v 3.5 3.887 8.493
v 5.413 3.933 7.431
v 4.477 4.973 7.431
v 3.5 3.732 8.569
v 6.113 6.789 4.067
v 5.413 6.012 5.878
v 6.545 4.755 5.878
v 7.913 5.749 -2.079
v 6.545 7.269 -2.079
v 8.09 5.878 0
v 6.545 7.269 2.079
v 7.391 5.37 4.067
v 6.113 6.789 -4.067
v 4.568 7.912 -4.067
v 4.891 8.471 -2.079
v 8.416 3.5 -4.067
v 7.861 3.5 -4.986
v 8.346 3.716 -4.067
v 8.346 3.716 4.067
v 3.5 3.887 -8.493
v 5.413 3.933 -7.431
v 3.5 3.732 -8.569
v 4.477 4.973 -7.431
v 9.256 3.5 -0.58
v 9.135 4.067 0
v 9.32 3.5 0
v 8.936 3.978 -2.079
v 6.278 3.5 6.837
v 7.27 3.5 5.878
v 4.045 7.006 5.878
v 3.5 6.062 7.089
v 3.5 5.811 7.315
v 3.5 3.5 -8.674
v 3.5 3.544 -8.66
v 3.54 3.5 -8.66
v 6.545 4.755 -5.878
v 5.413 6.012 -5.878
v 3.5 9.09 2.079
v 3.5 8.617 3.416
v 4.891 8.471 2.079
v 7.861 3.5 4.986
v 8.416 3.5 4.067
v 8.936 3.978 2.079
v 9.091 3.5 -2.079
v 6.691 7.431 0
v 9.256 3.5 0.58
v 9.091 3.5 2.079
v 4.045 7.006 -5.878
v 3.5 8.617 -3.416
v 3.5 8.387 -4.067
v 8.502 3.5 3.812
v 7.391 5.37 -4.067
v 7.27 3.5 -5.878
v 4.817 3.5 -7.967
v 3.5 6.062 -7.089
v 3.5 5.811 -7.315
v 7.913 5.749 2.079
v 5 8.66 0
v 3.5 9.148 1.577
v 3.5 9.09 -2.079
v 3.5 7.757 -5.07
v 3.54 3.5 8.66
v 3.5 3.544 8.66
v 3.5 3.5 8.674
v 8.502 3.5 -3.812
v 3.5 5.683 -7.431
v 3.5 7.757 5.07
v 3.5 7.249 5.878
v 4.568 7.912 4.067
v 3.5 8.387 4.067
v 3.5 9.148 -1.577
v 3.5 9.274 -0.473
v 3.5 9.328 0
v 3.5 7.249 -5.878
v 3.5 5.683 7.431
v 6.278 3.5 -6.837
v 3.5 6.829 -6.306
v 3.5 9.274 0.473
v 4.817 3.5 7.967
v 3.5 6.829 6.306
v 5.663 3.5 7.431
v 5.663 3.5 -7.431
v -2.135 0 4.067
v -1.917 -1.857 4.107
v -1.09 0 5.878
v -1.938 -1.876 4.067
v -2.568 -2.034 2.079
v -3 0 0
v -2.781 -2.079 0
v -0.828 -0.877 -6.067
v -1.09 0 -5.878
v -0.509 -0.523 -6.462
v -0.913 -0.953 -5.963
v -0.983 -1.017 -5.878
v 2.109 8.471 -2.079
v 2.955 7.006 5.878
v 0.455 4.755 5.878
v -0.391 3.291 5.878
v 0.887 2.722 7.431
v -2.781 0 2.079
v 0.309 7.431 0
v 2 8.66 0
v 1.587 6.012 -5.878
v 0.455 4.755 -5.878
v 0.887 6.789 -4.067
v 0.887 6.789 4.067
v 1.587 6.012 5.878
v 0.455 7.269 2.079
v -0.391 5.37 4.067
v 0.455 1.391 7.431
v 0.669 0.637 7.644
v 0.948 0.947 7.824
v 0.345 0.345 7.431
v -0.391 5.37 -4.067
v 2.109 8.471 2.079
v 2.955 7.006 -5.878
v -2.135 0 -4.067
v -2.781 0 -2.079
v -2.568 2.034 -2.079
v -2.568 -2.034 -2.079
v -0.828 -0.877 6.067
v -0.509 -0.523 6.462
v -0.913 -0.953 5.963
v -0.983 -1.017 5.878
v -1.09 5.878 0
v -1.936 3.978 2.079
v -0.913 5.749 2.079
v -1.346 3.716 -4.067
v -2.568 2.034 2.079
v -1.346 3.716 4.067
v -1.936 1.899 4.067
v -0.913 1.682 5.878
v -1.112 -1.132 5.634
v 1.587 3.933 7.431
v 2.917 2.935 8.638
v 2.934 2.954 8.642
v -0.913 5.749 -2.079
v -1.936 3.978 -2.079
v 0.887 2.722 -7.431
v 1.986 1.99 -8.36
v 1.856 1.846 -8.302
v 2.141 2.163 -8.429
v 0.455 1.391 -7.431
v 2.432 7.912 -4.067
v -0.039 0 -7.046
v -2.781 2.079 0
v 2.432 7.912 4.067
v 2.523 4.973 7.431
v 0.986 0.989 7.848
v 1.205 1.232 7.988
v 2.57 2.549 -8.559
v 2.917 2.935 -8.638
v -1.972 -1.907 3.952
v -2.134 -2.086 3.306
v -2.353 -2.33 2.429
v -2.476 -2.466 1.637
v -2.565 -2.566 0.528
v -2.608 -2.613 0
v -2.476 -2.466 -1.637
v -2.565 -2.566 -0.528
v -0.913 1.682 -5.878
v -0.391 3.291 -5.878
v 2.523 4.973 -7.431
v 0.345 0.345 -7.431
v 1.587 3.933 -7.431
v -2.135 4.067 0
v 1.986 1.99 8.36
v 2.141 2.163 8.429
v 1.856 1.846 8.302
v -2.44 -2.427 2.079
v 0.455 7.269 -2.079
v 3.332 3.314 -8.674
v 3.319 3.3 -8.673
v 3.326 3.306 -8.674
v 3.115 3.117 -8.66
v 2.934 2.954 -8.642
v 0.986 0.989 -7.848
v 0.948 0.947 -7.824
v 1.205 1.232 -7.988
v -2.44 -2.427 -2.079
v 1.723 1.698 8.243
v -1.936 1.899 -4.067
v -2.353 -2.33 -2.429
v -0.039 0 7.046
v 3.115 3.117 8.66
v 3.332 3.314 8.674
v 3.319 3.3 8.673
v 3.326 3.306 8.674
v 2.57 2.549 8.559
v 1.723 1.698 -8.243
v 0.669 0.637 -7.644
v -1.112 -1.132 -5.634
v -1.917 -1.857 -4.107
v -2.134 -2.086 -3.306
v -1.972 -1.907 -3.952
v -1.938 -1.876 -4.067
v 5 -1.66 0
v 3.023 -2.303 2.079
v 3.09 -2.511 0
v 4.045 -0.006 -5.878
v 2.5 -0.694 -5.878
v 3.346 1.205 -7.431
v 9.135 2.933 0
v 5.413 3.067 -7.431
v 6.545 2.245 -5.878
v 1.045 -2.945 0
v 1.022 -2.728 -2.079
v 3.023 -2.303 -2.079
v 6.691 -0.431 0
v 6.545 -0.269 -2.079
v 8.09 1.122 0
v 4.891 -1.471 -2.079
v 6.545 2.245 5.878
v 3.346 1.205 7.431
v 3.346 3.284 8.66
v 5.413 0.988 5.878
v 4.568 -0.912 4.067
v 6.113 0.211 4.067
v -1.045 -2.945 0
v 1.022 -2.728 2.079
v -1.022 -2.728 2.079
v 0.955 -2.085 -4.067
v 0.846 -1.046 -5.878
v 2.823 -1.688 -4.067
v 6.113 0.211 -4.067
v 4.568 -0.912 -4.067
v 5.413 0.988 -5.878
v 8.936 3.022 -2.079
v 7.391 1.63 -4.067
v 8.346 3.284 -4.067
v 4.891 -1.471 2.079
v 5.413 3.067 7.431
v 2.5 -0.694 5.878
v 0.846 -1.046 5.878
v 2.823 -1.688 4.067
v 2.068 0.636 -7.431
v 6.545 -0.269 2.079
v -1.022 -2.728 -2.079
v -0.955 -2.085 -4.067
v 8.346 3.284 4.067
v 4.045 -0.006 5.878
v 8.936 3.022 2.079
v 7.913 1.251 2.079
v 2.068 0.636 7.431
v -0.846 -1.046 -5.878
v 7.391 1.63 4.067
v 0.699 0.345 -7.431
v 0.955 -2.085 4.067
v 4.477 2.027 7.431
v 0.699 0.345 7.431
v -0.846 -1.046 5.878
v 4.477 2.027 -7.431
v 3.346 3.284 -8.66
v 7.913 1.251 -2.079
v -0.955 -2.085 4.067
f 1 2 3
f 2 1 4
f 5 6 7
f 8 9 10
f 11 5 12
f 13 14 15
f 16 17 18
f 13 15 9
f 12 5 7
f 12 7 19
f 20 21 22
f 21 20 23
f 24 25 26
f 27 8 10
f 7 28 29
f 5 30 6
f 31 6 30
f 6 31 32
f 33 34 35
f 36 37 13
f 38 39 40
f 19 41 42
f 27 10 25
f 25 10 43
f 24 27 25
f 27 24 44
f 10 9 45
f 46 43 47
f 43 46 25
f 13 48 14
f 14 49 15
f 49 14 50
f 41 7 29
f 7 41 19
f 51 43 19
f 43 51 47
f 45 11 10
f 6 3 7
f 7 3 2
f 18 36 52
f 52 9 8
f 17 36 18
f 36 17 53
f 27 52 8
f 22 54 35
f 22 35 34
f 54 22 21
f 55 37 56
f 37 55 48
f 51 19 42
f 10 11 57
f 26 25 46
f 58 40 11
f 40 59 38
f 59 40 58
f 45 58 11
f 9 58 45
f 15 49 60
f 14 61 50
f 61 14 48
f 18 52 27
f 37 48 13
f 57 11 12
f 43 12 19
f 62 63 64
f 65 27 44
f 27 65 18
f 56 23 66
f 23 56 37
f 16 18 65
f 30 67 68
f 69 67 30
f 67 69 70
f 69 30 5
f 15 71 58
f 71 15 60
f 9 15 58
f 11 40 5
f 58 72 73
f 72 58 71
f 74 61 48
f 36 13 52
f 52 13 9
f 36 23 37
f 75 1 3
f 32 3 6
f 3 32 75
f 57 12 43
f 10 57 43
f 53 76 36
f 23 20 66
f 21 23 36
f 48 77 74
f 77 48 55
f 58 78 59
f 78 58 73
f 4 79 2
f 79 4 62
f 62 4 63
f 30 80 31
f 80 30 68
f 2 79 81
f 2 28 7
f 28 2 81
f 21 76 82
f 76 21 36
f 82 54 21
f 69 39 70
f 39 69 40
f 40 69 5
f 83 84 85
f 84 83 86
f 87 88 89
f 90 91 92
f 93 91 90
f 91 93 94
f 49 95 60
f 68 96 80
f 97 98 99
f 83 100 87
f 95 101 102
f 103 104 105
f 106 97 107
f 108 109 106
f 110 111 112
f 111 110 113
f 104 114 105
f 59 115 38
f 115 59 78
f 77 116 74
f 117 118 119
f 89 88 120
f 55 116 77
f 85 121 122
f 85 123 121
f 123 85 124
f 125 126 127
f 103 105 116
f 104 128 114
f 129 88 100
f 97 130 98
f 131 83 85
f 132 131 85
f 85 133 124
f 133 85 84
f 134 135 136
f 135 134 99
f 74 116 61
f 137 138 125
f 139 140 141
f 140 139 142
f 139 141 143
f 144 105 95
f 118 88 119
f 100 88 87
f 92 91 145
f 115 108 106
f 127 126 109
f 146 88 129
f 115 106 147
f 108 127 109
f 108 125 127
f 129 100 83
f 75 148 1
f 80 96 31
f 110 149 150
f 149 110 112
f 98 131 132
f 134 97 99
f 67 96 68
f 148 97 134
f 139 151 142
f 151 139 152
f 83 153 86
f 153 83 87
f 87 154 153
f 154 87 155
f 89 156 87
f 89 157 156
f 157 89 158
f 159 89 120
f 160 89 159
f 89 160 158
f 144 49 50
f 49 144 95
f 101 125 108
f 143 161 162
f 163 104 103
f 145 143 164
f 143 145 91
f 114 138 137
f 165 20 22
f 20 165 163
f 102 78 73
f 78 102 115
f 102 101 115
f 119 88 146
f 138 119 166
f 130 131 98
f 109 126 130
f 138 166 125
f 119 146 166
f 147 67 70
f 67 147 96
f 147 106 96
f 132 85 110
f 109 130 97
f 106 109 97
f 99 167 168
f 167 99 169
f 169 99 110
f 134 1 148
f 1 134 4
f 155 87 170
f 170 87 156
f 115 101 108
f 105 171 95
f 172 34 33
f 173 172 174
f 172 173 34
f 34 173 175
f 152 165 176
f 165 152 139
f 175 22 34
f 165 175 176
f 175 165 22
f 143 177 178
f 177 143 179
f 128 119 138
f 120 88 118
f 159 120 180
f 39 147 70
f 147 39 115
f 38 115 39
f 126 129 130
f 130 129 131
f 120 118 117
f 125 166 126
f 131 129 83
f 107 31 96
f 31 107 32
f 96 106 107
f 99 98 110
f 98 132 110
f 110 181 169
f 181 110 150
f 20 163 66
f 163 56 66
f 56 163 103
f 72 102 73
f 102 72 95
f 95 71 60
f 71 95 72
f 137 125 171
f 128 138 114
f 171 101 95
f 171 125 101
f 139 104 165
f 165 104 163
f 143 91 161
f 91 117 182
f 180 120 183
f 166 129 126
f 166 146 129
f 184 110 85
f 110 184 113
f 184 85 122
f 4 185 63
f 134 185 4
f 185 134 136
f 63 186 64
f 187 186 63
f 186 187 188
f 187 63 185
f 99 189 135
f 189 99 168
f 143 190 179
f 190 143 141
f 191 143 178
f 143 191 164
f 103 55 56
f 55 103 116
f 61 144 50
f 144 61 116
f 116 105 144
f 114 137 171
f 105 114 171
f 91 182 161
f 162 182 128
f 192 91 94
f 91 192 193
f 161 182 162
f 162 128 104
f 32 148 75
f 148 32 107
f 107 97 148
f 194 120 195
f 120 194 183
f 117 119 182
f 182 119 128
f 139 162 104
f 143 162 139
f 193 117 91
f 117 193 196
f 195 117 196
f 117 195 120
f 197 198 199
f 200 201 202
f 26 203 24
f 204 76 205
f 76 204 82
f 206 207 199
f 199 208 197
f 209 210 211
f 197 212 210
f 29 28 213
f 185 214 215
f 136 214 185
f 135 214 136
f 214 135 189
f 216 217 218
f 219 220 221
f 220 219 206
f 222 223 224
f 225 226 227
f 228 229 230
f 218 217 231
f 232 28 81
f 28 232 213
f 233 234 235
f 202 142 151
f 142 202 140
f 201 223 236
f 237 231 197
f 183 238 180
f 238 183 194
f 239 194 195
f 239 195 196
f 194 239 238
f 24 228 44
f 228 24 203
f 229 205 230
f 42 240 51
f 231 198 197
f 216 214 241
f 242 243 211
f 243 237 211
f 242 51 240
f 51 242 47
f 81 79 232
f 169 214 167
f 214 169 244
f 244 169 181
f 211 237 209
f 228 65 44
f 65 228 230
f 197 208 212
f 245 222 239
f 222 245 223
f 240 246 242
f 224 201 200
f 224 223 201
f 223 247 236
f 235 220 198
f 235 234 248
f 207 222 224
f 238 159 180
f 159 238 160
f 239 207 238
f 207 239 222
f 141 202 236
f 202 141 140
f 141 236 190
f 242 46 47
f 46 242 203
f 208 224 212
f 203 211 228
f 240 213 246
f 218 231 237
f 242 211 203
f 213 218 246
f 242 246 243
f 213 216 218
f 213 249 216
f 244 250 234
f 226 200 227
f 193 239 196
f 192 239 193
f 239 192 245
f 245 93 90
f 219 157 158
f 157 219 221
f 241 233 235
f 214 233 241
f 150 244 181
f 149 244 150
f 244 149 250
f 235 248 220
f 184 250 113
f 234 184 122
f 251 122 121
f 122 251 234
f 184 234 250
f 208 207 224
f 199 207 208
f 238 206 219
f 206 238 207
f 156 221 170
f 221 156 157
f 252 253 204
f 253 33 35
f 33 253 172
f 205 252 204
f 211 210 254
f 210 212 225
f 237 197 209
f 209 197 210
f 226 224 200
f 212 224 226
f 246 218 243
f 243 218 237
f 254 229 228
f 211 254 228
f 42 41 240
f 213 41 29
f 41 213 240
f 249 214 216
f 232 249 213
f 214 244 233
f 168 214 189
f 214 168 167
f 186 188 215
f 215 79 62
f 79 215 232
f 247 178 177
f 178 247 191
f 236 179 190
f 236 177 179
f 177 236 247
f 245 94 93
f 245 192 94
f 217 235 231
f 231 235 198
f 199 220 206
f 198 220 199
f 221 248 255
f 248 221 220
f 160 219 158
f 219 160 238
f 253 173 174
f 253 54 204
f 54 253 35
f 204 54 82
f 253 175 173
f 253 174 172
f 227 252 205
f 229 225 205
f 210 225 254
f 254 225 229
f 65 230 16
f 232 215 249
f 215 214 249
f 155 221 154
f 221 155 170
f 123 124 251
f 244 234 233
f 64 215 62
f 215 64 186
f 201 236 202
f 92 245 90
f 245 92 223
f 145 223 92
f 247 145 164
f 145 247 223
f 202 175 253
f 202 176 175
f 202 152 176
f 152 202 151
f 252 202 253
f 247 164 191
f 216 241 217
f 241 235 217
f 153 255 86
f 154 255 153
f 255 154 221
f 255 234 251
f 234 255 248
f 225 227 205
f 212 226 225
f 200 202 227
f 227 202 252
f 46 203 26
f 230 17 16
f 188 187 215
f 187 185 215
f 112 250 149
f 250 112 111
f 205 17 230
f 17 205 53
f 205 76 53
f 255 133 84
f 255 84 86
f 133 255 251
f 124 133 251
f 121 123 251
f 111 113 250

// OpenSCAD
/*union() {
    sphere(r=10);
    translate([7,0,0])
        sphere(r=10);
}*/
/*difference() {
    sphere(r=10);
    translate([7,0,0])
        sphere(r=10);
}*/
/*difference() {
    sphere(r=10);
    translate([7,0,0])
        sphere(r=10);
    translate([0,7,0])
        sphere(r=10);
}*/
intersection() {
    sphere(r=10);
    translate([7,0,0])
        sphere(r=10);
    translate([0,7,0])
        sphere(r=10);
}
